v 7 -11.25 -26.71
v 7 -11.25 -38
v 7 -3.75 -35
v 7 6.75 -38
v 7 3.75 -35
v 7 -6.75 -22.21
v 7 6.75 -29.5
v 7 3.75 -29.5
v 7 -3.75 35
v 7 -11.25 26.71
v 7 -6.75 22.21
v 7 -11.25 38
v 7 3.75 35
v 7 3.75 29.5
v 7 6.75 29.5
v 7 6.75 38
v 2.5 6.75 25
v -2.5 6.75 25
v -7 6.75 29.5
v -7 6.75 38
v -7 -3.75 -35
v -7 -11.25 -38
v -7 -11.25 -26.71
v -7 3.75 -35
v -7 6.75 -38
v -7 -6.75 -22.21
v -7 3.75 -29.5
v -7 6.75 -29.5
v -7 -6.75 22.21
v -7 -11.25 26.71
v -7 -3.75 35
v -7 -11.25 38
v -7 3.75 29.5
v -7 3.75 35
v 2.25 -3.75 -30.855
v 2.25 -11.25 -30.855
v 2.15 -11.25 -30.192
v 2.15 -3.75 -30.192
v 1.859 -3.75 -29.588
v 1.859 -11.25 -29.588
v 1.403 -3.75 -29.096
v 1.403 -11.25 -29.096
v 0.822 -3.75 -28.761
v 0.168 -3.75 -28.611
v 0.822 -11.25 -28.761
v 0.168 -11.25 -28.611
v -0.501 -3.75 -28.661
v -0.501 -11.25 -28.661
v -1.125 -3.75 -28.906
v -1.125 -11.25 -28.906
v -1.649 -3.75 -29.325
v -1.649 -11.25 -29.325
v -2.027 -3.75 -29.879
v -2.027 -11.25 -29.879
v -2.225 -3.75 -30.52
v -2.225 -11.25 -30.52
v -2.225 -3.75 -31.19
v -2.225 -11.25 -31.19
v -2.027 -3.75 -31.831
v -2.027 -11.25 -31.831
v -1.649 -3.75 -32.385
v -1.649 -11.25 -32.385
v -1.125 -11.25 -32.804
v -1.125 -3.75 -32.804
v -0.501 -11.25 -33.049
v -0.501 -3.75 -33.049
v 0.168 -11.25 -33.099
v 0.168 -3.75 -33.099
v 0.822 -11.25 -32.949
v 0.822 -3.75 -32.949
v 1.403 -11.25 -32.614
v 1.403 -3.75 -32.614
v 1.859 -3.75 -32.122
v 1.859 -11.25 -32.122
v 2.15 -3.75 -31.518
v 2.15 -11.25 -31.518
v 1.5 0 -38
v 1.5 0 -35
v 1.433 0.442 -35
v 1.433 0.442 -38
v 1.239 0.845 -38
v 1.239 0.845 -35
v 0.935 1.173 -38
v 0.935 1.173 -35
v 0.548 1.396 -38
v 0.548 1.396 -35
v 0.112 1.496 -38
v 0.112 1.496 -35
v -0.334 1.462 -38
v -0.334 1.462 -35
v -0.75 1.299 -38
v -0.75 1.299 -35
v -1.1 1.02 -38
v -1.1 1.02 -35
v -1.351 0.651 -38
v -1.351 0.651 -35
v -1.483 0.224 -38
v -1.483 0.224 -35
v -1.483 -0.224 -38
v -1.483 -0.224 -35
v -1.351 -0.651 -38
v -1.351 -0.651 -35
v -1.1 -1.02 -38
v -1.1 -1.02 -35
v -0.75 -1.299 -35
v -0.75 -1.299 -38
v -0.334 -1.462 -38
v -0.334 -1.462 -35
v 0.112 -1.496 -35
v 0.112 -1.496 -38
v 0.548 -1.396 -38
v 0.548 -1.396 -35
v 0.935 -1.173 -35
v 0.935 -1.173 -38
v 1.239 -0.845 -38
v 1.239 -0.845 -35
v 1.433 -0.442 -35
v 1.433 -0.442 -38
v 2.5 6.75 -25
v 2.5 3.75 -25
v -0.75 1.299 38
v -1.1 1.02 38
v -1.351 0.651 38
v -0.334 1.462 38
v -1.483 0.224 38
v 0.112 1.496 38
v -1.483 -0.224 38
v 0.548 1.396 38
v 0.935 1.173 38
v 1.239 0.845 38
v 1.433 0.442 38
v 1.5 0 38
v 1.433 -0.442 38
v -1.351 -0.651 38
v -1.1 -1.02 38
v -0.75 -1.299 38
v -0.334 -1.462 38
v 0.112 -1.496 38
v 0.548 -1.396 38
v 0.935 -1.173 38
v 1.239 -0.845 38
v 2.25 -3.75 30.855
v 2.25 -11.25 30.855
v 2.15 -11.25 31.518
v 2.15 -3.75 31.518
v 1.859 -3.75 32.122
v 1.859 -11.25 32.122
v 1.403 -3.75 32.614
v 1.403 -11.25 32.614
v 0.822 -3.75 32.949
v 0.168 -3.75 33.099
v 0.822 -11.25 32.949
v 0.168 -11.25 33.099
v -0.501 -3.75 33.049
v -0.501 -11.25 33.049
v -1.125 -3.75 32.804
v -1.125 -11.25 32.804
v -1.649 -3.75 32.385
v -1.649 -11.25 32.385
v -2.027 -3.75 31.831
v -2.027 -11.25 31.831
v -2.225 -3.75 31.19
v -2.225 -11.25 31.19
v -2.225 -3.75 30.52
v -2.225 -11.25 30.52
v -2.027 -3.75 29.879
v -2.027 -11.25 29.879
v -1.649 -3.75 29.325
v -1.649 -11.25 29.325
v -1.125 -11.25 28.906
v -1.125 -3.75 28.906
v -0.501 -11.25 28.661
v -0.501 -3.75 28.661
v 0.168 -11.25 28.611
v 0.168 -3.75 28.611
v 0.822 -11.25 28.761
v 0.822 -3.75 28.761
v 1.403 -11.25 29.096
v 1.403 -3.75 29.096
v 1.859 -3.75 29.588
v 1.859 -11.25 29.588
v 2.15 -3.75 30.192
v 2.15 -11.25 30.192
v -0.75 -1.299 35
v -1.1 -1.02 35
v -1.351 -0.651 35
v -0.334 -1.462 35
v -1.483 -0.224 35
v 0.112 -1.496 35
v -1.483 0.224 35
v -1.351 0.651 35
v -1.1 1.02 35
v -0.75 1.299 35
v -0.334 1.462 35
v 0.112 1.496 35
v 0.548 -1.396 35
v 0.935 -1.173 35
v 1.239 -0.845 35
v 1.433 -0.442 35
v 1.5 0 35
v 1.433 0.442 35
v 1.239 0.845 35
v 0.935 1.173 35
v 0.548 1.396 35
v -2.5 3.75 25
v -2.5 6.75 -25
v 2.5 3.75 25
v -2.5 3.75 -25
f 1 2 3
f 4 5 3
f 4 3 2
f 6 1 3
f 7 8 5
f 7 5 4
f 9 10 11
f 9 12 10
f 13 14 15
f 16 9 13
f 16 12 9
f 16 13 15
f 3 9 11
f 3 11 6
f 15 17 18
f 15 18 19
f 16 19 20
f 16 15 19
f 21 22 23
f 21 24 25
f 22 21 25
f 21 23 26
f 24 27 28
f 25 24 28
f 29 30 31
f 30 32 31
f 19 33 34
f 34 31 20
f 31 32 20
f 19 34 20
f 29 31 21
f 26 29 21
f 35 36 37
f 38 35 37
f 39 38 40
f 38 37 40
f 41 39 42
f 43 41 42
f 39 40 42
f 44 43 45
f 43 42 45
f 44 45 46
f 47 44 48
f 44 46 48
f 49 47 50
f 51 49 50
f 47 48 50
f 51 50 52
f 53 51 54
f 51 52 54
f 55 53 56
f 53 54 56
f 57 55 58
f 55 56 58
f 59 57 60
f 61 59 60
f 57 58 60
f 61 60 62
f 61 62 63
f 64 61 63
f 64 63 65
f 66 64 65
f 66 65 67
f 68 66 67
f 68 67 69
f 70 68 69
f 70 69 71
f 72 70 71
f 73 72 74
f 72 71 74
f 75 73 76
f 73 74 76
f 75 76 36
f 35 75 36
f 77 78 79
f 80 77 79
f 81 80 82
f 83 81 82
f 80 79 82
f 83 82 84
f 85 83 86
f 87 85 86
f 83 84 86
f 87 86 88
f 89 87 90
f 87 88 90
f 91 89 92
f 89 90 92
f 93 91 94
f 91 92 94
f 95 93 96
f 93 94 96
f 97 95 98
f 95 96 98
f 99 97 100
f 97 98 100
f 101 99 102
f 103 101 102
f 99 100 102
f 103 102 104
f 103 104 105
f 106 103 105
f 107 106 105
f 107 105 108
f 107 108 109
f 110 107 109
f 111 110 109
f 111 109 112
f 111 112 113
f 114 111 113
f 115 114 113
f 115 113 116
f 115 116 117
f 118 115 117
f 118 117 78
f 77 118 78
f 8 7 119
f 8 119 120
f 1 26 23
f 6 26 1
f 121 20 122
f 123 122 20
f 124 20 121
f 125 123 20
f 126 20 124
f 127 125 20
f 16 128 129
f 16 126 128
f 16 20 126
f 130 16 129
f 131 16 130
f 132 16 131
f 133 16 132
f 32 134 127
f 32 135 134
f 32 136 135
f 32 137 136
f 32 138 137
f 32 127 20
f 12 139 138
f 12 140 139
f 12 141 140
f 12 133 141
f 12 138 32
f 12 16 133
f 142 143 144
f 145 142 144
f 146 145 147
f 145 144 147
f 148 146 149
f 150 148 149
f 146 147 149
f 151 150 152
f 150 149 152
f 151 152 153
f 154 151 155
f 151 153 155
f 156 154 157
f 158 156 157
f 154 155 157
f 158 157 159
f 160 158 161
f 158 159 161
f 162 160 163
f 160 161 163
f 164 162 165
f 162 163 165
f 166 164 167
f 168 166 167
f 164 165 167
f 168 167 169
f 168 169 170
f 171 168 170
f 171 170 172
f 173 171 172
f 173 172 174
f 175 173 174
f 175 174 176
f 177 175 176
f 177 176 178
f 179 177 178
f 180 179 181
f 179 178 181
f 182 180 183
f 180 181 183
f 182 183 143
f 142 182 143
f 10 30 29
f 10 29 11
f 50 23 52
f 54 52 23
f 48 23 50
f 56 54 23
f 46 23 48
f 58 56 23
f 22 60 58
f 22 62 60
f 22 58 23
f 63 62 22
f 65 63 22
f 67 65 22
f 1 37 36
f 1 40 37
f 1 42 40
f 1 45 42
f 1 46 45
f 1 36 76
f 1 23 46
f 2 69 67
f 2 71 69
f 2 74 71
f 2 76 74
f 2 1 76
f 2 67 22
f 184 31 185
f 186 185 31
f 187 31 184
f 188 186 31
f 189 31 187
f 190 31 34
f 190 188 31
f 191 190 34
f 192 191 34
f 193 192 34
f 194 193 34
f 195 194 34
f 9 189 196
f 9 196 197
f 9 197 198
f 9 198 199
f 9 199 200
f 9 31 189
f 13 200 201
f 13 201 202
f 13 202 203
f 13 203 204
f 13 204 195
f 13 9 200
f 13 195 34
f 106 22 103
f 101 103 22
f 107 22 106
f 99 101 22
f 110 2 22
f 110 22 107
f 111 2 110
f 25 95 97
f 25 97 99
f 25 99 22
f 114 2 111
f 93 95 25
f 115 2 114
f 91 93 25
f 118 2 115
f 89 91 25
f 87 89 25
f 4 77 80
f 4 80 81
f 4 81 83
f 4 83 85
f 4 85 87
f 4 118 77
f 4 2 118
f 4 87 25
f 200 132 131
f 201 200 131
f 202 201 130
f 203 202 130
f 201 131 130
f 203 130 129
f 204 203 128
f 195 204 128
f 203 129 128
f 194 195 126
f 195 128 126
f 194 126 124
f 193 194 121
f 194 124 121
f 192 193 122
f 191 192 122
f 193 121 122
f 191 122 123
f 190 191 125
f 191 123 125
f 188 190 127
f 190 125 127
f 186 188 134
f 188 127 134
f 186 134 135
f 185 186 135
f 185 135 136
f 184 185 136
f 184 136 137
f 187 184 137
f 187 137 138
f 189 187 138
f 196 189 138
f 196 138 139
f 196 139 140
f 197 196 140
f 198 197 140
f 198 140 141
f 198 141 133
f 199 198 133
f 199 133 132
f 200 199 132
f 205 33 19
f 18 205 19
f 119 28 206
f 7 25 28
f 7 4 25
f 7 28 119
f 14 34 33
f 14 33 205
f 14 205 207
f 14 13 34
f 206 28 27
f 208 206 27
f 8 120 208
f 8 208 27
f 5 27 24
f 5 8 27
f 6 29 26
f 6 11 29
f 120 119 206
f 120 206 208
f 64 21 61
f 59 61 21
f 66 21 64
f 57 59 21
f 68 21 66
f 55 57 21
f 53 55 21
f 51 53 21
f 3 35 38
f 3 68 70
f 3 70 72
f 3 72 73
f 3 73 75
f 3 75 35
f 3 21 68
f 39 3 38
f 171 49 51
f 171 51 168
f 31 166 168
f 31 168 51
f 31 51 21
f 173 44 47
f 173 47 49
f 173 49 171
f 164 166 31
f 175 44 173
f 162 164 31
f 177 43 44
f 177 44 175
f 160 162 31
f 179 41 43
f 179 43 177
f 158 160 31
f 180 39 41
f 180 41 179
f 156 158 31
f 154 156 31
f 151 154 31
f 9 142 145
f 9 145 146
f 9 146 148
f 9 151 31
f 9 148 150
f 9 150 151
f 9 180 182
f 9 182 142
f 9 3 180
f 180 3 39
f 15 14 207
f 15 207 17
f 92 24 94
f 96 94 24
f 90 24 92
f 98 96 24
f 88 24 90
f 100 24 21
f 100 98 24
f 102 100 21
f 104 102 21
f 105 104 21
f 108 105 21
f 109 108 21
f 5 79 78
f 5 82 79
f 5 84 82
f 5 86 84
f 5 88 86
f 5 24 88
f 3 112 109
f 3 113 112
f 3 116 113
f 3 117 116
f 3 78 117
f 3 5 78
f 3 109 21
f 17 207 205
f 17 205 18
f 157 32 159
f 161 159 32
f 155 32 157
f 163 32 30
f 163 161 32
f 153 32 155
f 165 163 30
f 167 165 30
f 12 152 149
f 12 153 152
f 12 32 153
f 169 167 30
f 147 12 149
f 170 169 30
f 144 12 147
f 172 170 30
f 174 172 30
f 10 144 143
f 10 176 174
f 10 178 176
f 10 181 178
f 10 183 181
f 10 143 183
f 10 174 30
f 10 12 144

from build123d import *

# Parameters (mm, degrees)
F1_DEPTH = 7
F2_SIZE  = 4.49999
F3_R     = 2.25
F4_DEPTH = 7.5
F5_R     = 1.5
F6_DEPTH = 76.001


# Not quite as in the source:
# - a fillet or chamfer is up to 0.001 mm smaller than in the source, because OpenCascade refuses the exact size


with BuildPart() as f1:
    # F0 (on Right) → F1 (new body, symmetric)
    with BuildSketch(Plane.YZ):
        Polygon((-3.75, 35), (3.75, 35), (3.75, 25), (6.75, 25), (6.75, 38), (-11.25, 38), (-11.25, 26.71), (-6.75, 26.71), (-6.75, -26.71), (-11.25, -26.71), (-11.25, -38), (6.75, -38), (6.75, -25), (3.75, -25), (3.75, -35), (-3.75, -35), align=None)
    extrude(amount=F1_DEPTH, both=True)

    # F2 (size 4.5 in the source; OpenCascade refuses exactly that, so slightly less here)
    f2_edges = [f1.edges().sort_by_distance(p)[0] for p in [
        (0, -6.75, 26.71),
        (0, -6.75, -26.71),
        (-7, 5.25, 25),
        (7, 5.25, 25),
        (-7, 5.25, -25),
        (7, 5.25, -25),
    ]]
    chamfer(f2_edges, length=F2_SIZE)

    # F3 (on face) → F4 (cut, through all)
    with BuildSketch(Plane.XZ.offset(11.25)):
        with Locations((0, 30.855)):
            Circle(F3_R)
        with Locations((0, -30.855)):
            Circle(F3_R)
    extrude(amount=-F4_DEPTH, mode=Mode.SUBTRACT)

    # F5 (on face) → F6 (cut, through all)
    with BuildSketch(Plane.XY.offset(38)):
        Circle(F5_R)
    extrude(amount=-F6_DEPTH, mode=Mode.SUBTRACT)


solid = f1.part
